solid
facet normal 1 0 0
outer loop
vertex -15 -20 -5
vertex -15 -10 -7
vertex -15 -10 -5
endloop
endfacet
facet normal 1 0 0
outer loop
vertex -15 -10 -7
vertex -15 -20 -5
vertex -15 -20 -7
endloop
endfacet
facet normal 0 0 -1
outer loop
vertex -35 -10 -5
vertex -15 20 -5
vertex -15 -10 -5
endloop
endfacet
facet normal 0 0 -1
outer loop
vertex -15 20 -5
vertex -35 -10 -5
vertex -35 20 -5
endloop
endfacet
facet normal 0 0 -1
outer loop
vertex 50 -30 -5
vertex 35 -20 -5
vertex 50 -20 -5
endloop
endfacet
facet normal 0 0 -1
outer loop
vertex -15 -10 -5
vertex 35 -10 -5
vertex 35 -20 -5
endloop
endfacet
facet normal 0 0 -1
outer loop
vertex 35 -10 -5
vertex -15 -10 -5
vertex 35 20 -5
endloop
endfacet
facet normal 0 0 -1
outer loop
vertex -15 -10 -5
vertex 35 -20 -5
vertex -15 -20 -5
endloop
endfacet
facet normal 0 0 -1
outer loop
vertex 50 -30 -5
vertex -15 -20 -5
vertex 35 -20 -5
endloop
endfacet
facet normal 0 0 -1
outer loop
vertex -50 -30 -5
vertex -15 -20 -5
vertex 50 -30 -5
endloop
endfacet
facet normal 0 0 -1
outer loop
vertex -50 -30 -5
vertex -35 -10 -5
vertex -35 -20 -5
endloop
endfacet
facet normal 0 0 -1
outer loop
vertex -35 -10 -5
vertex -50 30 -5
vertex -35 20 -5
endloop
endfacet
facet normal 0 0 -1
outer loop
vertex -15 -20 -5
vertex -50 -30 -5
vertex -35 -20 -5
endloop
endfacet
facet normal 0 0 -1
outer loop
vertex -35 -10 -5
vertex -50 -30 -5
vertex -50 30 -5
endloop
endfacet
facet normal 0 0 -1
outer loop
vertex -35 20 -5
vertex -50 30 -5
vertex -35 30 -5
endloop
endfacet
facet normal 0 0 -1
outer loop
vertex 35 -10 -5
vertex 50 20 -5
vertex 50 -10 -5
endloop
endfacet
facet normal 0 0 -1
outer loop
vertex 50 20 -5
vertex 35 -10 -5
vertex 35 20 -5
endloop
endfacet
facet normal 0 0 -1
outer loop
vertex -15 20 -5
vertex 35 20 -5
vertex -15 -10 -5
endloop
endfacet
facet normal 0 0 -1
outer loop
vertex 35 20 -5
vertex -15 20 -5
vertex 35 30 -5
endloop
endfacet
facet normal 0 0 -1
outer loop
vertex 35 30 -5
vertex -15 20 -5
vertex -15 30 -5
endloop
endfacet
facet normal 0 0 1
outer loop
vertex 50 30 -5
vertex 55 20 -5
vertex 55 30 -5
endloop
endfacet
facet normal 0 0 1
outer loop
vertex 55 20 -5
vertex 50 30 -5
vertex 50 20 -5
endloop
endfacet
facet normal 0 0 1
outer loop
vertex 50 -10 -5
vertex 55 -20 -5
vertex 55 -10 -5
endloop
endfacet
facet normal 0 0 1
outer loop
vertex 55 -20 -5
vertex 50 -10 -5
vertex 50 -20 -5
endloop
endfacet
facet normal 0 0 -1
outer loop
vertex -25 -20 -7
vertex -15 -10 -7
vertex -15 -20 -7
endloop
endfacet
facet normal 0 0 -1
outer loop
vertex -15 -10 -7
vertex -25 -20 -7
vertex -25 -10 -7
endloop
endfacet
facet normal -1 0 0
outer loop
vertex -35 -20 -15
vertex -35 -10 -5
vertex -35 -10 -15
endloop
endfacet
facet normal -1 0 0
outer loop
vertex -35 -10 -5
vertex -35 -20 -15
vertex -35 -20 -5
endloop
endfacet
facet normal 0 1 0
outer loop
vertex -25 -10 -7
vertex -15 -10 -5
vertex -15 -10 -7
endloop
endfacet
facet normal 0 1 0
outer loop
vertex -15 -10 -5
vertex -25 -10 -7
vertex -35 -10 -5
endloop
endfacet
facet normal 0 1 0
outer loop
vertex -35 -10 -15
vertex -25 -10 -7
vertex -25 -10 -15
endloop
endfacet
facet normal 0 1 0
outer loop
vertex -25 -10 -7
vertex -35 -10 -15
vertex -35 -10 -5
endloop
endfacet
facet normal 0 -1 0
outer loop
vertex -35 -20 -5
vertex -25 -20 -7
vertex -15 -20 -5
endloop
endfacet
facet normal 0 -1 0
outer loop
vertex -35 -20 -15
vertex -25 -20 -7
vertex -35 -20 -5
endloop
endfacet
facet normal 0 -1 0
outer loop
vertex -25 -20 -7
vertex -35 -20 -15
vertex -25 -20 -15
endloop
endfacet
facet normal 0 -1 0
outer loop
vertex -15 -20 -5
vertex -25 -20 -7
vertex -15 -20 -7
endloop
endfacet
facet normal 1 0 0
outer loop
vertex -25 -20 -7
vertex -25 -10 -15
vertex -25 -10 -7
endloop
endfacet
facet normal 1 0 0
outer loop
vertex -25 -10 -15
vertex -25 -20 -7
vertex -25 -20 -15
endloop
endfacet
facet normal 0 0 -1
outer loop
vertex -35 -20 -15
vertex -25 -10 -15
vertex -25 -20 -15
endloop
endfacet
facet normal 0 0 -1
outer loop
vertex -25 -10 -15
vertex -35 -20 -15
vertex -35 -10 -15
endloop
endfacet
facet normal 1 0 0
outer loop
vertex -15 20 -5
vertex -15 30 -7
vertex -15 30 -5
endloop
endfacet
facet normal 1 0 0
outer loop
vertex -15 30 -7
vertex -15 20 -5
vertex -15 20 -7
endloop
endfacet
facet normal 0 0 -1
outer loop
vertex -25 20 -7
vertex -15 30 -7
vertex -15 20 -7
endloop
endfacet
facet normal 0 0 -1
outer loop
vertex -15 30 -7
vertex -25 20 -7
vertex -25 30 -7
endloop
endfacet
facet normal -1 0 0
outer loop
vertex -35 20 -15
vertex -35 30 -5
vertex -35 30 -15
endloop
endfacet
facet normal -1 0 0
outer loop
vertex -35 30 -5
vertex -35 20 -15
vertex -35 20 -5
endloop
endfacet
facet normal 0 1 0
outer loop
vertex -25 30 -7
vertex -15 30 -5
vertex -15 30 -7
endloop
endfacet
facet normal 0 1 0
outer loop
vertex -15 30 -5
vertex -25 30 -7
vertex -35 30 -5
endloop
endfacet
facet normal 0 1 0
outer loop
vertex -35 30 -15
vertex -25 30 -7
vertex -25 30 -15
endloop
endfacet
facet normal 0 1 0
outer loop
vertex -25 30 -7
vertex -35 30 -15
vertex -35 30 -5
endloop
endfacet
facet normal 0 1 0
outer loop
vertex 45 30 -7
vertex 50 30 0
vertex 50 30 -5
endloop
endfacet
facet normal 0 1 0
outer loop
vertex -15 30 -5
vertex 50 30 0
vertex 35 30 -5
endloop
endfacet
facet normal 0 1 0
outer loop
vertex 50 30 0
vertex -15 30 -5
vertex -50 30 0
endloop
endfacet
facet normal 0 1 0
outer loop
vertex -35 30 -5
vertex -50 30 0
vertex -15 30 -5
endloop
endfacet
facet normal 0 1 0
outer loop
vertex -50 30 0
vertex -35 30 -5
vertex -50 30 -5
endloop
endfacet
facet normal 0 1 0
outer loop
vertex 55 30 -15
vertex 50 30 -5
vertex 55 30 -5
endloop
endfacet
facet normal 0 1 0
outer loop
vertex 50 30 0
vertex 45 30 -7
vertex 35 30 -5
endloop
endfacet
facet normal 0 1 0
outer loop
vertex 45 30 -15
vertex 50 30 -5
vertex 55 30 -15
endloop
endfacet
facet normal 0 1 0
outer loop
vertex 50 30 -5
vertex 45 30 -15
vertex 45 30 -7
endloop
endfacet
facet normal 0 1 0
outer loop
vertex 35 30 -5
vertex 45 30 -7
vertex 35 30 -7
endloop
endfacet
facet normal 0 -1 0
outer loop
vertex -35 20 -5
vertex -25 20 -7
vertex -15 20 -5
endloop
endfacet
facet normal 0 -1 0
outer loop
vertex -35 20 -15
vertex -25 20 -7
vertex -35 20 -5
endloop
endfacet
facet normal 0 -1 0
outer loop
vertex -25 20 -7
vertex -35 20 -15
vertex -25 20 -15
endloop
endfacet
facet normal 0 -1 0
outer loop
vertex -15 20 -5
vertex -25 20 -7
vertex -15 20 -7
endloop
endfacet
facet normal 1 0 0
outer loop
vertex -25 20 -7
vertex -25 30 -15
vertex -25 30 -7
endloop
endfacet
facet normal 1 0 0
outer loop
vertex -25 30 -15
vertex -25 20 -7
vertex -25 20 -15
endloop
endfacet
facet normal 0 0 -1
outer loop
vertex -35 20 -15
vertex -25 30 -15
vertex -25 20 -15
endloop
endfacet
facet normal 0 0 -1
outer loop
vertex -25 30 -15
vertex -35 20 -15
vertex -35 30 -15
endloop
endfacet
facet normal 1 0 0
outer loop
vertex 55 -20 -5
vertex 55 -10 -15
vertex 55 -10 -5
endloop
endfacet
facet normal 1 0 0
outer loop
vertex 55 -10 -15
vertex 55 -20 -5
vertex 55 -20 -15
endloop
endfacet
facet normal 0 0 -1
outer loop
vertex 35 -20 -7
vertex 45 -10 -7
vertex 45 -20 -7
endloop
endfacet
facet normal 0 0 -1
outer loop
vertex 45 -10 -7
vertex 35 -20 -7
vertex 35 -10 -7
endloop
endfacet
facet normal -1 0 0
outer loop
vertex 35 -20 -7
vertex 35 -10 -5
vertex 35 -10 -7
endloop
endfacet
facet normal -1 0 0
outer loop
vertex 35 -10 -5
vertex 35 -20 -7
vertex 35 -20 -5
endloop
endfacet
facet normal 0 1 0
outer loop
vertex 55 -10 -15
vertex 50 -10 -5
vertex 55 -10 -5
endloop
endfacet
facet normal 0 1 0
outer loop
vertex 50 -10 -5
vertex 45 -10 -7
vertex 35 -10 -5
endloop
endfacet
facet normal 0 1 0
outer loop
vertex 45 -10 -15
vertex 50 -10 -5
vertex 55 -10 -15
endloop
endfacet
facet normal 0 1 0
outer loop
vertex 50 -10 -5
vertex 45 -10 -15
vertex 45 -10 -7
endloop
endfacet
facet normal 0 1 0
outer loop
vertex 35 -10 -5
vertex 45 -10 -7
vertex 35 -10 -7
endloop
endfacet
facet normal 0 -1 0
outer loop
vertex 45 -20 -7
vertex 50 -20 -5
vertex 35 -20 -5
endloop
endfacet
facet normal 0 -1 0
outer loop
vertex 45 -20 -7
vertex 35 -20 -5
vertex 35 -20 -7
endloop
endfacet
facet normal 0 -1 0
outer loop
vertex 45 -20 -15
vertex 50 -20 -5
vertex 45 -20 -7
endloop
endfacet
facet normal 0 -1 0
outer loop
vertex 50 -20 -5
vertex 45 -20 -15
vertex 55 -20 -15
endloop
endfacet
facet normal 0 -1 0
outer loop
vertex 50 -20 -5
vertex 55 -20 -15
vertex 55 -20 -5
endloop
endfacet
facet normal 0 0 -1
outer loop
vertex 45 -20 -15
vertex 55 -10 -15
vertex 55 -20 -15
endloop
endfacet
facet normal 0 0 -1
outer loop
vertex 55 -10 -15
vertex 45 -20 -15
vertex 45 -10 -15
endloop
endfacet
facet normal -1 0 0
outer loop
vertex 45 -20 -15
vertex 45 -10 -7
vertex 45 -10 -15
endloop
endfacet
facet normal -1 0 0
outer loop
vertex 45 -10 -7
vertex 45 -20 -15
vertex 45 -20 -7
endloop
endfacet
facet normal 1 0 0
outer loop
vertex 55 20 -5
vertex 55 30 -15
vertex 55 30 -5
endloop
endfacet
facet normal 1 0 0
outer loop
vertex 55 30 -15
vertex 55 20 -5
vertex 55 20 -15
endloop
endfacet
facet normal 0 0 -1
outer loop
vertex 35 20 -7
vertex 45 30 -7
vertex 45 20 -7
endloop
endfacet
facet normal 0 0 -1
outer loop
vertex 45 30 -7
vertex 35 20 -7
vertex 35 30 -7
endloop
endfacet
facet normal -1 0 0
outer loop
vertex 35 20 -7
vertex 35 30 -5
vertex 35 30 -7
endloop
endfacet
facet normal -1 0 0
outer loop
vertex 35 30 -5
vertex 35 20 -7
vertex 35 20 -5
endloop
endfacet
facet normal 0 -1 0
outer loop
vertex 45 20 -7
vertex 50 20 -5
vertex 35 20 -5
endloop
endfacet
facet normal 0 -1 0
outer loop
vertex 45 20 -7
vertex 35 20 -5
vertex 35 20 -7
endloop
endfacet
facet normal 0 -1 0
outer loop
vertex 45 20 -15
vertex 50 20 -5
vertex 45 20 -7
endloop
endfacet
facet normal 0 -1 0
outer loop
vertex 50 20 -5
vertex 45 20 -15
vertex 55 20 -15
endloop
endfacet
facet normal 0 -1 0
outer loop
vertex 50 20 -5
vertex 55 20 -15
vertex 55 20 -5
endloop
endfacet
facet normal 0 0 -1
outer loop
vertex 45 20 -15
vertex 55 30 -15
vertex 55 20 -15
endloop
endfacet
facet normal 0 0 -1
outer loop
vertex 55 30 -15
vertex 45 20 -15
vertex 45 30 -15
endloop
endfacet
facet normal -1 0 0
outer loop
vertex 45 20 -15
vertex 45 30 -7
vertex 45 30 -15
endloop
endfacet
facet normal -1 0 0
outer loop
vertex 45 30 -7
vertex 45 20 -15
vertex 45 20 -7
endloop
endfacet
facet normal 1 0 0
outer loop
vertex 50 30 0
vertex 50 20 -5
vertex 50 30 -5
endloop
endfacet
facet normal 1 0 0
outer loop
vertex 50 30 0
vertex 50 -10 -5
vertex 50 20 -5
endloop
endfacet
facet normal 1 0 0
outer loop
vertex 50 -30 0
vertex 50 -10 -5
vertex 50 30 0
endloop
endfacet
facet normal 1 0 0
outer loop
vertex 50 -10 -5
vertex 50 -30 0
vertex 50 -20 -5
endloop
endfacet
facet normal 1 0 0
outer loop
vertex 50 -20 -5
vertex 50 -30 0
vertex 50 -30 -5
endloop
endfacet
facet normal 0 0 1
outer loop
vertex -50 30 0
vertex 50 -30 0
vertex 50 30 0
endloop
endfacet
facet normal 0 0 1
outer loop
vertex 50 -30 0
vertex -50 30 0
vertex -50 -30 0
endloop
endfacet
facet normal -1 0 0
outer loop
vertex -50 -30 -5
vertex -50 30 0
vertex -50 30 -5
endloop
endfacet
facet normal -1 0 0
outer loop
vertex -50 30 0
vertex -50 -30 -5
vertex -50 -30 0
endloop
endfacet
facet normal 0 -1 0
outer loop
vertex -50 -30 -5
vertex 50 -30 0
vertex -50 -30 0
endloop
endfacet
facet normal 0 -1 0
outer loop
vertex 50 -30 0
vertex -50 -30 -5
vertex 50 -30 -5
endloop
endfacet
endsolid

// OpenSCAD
// Parametric Rectangular Slab with Two-Tier Underside Pads
// All dimensions in millimeters

// --- Slab dimensions ---
slab_length = 100;   // X-axis (left-right)
slab_width  = 60;    // Y-axis (front-back)
slab_thickness = 5;  // Z-axis height of the main slab

// --- Pad parameters ---
pad_width  = 20;     // width of the shallow pad (X)
pad_depth  = 10;     // depth of the pad (Y)
pad_height = 2;      // height of the shallow pad (Z)

deep_width  = 10;    // width of the deeper continuation (X, narrower)
deep_height = 8;     // height of the deeper continuation (Z, below shallow pad)

pad_inset = 5;       // distance from slab edges to pad edges

// --- Pad module ---
// Creates a two-tier protrusion with top at z=0, extending downward.
// align_left = true  -> deep part flush with left edge of shallow pad
// align_left = false -> deep part flush with right edge
module two_tier_pad(align_left = true) {
    // Shallow wide pad: top at z=0, bottom at z=-pad_height
    translate([0, 0, -pad_height])
        cube([pad_width, pad_depth, pad_height]);

    // Deeper narrow continuation: top at z=-pad_height, bottom at z=-(pad_height+deep_height)
    x_offset = align_left ? 0 : pad_width - deep_width;
    translate([x_offset, 0, -pad_height - deep_height])
        cube([deep_width, pad_depth, deep_height]);
}

// --- Main model ---
union() {
    // Central slab centered on X and Y, top at z=0, bottom at z=-slab_thickness
    translate([-slab_length/2, -slab_width/2, -slab_thickness])
        cube([slab_length, slab_width, slab_thickness]);

    // Front-left pad (left side, deep part aligned left)
    translate([
        -slab_length/2 + pad_inset + pad_width/2,
        -slab_width/2 + pad_inset + pad_depth/2,
        -slab_thickness
    ])
        two_tier_pad(align_left = true);

    // Back-left pad
    translate([
        -slab_length/2 + pad_inset + pad_width/2,
        slab_width/2 - pad_inset - pad_depth/2,
        -slab_thickness
    ])
        two_tier_pad(align_left = true);

    // Front-right pad (right side, deep part aligned right)
    translate([
        slab_length/2 - pad_inset - pad_width/2,
        -slab_width/2 + pad_inset + pad_depth/2,
        -slab_thickness
    ])
        two_tier_pad(align_left = false);

    // Back-right pad
    translate([
        slab_length/2 - pad_inset - pad_width/2,
        slab_width/2 - pad_inset - pad_depth/2,
        -slab_thickness
    ])
        two_tier_pad(align_left = false);
}
